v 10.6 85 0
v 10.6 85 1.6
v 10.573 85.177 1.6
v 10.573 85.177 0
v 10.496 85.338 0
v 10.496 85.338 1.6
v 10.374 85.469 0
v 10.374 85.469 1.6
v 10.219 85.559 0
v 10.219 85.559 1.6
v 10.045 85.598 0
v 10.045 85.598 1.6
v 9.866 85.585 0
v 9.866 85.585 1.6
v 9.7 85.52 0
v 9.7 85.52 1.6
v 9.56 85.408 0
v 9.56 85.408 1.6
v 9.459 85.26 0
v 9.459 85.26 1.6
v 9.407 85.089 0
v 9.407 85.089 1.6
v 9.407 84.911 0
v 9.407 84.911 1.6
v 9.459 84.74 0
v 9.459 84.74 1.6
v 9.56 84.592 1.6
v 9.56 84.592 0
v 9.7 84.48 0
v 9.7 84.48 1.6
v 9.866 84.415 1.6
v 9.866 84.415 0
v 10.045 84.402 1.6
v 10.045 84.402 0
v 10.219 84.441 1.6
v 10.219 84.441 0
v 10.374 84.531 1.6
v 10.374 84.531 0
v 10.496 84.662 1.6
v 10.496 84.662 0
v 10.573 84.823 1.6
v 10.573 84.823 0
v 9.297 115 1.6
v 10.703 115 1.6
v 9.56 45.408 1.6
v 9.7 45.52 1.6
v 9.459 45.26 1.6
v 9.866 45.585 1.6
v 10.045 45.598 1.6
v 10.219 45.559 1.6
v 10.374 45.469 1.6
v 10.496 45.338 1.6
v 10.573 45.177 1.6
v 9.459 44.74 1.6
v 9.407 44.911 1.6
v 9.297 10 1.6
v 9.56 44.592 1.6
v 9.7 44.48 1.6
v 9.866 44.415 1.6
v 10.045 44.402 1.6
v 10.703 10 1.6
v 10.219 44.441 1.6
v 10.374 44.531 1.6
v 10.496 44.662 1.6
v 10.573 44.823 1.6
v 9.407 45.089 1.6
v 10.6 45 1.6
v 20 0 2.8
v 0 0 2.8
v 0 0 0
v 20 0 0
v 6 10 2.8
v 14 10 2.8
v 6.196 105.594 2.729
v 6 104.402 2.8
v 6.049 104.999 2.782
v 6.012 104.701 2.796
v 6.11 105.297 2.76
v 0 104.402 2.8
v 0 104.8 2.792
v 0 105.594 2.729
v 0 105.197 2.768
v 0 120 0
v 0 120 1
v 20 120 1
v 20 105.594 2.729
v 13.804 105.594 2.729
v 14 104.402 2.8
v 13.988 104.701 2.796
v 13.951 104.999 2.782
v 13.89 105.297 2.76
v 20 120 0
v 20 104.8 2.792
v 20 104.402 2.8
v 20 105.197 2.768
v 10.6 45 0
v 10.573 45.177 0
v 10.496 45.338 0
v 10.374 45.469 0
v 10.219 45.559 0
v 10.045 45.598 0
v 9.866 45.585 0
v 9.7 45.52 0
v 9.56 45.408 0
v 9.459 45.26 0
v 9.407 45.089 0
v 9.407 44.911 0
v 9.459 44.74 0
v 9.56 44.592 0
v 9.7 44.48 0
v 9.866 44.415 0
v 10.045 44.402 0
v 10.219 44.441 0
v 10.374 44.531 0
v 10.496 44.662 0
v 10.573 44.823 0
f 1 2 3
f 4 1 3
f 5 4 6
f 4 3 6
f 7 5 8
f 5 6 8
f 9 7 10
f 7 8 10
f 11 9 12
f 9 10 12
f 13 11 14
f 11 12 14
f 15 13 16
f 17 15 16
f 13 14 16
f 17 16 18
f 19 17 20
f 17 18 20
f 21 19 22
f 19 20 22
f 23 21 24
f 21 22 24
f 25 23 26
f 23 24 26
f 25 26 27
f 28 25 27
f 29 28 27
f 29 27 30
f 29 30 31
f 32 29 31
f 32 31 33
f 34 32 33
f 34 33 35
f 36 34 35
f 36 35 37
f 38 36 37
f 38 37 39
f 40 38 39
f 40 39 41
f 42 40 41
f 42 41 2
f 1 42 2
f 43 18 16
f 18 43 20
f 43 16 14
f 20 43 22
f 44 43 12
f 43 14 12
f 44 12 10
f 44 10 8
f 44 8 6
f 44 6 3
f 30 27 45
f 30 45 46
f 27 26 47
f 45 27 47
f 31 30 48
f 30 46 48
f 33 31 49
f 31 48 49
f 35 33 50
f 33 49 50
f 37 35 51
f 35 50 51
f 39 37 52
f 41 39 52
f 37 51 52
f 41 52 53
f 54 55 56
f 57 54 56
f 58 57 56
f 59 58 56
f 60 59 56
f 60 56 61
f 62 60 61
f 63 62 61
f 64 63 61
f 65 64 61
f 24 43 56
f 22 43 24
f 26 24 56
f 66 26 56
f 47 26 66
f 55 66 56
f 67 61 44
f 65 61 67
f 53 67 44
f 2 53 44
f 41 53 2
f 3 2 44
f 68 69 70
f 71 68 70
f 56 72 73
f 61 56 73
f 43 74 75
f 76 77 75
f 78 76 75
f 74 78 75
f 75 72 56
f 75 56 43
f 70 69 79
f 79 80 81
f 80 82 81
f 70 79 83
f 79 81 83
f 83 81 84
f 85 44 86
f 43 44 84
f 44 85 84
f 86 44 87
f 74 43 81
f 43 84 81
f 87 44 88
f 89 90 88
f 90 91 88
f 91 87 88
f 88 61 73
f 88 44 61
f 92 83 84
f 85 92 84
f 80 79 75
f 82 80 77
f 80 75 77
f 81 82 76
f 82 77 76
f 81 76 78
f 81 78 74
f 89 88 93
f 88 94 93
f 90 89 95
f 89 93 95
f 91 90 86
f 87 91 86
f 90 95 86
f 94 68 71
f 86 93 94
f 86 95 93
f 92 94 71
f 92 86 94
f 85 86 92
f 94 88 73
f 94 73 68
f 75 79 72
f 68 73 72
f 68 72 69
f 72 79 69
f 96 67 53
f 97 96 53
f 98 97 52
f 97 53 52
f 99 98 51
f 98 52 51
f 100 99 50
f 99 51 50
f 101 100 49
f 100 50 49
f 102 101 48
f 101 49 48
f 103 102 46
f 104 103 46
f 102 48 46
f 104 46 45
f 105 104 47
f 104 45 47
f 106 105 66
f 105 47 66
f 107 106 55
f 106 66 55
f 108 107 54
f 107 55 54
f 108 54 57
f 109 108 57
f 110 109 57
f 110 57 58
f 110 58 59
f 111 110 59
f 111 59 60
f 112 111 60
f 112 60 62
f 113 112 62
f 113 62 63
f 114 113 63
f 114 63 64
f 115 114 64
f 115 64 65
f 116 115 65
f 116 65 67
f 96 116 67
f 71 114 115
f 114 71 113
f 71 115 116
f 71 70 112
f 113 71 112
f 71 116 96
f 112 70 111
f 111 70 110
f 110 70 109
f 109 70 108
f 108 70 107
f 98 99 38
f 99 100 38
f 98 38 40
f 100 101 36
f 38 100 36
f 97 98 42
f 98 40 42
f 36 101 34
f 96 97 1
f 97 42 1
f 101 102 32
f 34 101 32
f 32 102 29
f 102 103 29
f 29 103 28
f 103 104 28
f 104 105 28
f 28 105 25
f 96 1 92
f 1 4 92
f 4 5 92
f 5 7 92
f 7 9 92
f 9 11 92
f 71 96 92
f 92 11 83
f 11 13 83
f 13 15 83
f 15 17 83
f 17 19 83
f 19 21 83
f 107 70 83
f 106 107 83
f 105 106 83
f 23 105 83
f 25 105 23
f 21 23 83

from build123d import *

# Parameters (mm, degrees)
F1_DEPTH = 20
F3_DEPTH = 120
F6_R     = 0.6
F7_DEPTH = 25
F8_R     = 10


with BuildPart() as f1:
    # F0 (on Right) → F1 (new body)
    with BuildSketch(Plane.YZ):
        Polygon((0, 2.8), (0, 0), (120, 0), (120, 1), (105, 2.8), align=None)
    extrude(amount=F1_DEPTH)


with BuildPart() as f3:
    # F2 (on face) → F3 (new body)
    with BuildSketch(Plane.XZ):
        Polygon((6, 2.8), (9.296973, 1.6), (10.703027, 1.6), (14, 2.8), align=None)
    extrude(amount=-F3_DEPTH)


with BuildPart() as f3_1:
    # F4: moved
    add(f3.part.moved(Location((0, 10, 0))))


with BuildPart() as f1_1:
    add(f1.part)

    # F5: cut F3
    add(f3_1.part, mode=Mode.SUBTRACT)

    # F6 (on face) → F7 (cut)
    with BuildSketch(Plane.XY.offset(1.6)):
        with Locations((10, 85)):
            Circle(F6_R)
        with Locations((10, 45)):
            Circle(F6_R)
    extrude(amount=-F7_DEPTH, mode=Mode.SUBTRACT)

    # F8
    f8_edges = [f1_1.edges().sort_by_distance(p)[0] for p in [
        (17, 105, 2.8),
        (3, 105, 2.8),
    ]]
    fillet(f8_edges, radius=F8_R)


solid = f1_1.part
